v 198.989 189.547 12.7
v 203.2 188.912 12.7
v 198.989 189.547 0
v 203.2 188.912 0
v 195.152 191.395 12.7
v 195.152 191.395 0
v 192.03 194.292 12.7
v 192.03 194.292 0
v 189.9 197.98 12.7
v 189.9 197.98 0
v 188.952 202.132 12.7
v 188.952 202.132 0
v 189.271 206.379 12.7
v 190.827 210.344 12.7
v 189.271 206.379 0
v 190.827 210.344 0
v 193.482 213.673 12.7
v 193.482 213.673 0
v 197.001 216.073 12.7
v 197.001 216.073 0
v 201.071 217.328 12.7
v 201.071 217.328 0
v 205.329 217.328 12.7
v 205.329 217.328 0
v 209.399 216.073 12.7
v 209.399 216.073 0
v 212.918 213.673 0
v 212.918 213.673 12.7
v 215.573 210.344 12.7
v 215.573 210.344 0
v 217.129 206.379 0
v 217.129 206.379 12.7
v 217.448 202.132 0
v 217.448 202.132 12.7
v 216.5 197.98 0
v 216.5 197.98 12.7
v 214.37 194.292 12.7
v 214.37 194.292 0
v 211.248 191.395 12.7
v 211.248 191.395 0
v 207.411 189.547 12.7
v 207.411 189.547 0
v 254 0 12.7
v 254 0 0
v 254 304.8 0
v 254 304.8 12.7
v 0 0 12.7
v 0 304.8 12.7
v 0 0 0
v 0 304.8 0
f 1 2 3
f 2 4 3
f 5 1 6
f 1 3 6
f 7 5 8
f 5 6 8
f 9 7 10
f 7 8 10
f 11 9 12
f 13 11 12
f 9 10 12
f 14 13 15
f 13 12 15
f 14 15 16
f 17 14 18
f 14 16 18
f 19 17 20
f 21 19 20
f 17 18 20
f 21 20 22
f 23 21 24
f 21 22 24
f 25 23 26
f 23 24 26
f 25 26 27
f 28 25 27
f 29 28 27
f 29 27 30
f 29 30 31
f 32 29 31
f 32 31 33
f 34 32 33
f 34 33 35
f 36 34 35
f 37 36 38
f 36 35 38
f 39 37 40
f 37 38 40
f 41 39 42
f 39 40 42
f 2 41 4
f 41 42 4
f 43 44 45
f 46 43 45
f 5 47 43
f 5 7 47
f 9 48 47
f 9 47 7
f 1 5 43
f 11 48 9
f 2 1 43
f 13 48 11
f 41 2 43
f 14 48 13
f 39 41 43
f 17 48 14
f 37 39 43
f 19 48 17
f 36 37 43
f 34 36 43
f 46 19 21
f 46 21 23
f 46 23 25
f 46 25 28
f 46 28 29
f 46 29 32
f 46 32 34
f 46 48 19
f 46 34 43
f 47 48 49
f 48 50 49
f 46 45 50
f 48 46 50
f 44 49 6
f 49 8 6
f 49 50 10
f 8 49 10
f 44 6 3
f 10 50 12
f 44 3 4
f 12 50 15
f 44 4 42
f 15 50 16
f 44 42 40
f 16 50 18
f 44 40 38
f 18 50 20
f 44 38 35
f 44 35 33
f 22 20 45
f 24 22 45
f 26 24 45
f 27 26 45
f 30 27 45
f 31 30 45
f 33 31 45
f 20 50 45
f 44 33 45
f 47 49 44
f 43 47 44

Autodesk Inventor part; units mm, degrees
ref_plane "YZ Plane" through (0, 0, 0) normal (1, 0, 0) x (0, 1, 0)
ref_plane "XZ Plane" through (0, 0, 0) normal (0, 1, 0) x (-1, 0, 0)
ref_plane "XY Plane" through (0, 0, 0) normal (0, 0, 1) x (1, 0, 0)
sketch "Sketch1" plane through (0, 0, 0) normal (0, 0, 1) x (1, 0, 0)
  line L0 (0, 0) -> (254, 0)
  line L1 (254, 0) -> (254, 304.8)
  line L2 (254, 304.8) -> (0, 304.8)
  line L3 (0, 304.8) -> (0, 0)
  dimension "d0" = 254
  dimension "d1" = 304.8
extrude "Extrusion1" add sketch "Sketch1" along normal blind 12.7
sketch "Sketch2" plane through (0, 0, 12.7) normal (0, 0, 1) x (1, 0, 0)
  line L0 (0, 0) -> (254, 0) projected
  line L1 (254, 0) -> (254, 304.8) projected
  point P0 (203.2, 203.2)
  dimension "d11" = 203.2
  dimension "d12" = 50.8
hole "Hole1" at (203.2, 203.2, 12.7) direction (0, 0, -1) diameter 28.575 end through all
properties part number "Shaft Mount" material "Wood (Maple)"
